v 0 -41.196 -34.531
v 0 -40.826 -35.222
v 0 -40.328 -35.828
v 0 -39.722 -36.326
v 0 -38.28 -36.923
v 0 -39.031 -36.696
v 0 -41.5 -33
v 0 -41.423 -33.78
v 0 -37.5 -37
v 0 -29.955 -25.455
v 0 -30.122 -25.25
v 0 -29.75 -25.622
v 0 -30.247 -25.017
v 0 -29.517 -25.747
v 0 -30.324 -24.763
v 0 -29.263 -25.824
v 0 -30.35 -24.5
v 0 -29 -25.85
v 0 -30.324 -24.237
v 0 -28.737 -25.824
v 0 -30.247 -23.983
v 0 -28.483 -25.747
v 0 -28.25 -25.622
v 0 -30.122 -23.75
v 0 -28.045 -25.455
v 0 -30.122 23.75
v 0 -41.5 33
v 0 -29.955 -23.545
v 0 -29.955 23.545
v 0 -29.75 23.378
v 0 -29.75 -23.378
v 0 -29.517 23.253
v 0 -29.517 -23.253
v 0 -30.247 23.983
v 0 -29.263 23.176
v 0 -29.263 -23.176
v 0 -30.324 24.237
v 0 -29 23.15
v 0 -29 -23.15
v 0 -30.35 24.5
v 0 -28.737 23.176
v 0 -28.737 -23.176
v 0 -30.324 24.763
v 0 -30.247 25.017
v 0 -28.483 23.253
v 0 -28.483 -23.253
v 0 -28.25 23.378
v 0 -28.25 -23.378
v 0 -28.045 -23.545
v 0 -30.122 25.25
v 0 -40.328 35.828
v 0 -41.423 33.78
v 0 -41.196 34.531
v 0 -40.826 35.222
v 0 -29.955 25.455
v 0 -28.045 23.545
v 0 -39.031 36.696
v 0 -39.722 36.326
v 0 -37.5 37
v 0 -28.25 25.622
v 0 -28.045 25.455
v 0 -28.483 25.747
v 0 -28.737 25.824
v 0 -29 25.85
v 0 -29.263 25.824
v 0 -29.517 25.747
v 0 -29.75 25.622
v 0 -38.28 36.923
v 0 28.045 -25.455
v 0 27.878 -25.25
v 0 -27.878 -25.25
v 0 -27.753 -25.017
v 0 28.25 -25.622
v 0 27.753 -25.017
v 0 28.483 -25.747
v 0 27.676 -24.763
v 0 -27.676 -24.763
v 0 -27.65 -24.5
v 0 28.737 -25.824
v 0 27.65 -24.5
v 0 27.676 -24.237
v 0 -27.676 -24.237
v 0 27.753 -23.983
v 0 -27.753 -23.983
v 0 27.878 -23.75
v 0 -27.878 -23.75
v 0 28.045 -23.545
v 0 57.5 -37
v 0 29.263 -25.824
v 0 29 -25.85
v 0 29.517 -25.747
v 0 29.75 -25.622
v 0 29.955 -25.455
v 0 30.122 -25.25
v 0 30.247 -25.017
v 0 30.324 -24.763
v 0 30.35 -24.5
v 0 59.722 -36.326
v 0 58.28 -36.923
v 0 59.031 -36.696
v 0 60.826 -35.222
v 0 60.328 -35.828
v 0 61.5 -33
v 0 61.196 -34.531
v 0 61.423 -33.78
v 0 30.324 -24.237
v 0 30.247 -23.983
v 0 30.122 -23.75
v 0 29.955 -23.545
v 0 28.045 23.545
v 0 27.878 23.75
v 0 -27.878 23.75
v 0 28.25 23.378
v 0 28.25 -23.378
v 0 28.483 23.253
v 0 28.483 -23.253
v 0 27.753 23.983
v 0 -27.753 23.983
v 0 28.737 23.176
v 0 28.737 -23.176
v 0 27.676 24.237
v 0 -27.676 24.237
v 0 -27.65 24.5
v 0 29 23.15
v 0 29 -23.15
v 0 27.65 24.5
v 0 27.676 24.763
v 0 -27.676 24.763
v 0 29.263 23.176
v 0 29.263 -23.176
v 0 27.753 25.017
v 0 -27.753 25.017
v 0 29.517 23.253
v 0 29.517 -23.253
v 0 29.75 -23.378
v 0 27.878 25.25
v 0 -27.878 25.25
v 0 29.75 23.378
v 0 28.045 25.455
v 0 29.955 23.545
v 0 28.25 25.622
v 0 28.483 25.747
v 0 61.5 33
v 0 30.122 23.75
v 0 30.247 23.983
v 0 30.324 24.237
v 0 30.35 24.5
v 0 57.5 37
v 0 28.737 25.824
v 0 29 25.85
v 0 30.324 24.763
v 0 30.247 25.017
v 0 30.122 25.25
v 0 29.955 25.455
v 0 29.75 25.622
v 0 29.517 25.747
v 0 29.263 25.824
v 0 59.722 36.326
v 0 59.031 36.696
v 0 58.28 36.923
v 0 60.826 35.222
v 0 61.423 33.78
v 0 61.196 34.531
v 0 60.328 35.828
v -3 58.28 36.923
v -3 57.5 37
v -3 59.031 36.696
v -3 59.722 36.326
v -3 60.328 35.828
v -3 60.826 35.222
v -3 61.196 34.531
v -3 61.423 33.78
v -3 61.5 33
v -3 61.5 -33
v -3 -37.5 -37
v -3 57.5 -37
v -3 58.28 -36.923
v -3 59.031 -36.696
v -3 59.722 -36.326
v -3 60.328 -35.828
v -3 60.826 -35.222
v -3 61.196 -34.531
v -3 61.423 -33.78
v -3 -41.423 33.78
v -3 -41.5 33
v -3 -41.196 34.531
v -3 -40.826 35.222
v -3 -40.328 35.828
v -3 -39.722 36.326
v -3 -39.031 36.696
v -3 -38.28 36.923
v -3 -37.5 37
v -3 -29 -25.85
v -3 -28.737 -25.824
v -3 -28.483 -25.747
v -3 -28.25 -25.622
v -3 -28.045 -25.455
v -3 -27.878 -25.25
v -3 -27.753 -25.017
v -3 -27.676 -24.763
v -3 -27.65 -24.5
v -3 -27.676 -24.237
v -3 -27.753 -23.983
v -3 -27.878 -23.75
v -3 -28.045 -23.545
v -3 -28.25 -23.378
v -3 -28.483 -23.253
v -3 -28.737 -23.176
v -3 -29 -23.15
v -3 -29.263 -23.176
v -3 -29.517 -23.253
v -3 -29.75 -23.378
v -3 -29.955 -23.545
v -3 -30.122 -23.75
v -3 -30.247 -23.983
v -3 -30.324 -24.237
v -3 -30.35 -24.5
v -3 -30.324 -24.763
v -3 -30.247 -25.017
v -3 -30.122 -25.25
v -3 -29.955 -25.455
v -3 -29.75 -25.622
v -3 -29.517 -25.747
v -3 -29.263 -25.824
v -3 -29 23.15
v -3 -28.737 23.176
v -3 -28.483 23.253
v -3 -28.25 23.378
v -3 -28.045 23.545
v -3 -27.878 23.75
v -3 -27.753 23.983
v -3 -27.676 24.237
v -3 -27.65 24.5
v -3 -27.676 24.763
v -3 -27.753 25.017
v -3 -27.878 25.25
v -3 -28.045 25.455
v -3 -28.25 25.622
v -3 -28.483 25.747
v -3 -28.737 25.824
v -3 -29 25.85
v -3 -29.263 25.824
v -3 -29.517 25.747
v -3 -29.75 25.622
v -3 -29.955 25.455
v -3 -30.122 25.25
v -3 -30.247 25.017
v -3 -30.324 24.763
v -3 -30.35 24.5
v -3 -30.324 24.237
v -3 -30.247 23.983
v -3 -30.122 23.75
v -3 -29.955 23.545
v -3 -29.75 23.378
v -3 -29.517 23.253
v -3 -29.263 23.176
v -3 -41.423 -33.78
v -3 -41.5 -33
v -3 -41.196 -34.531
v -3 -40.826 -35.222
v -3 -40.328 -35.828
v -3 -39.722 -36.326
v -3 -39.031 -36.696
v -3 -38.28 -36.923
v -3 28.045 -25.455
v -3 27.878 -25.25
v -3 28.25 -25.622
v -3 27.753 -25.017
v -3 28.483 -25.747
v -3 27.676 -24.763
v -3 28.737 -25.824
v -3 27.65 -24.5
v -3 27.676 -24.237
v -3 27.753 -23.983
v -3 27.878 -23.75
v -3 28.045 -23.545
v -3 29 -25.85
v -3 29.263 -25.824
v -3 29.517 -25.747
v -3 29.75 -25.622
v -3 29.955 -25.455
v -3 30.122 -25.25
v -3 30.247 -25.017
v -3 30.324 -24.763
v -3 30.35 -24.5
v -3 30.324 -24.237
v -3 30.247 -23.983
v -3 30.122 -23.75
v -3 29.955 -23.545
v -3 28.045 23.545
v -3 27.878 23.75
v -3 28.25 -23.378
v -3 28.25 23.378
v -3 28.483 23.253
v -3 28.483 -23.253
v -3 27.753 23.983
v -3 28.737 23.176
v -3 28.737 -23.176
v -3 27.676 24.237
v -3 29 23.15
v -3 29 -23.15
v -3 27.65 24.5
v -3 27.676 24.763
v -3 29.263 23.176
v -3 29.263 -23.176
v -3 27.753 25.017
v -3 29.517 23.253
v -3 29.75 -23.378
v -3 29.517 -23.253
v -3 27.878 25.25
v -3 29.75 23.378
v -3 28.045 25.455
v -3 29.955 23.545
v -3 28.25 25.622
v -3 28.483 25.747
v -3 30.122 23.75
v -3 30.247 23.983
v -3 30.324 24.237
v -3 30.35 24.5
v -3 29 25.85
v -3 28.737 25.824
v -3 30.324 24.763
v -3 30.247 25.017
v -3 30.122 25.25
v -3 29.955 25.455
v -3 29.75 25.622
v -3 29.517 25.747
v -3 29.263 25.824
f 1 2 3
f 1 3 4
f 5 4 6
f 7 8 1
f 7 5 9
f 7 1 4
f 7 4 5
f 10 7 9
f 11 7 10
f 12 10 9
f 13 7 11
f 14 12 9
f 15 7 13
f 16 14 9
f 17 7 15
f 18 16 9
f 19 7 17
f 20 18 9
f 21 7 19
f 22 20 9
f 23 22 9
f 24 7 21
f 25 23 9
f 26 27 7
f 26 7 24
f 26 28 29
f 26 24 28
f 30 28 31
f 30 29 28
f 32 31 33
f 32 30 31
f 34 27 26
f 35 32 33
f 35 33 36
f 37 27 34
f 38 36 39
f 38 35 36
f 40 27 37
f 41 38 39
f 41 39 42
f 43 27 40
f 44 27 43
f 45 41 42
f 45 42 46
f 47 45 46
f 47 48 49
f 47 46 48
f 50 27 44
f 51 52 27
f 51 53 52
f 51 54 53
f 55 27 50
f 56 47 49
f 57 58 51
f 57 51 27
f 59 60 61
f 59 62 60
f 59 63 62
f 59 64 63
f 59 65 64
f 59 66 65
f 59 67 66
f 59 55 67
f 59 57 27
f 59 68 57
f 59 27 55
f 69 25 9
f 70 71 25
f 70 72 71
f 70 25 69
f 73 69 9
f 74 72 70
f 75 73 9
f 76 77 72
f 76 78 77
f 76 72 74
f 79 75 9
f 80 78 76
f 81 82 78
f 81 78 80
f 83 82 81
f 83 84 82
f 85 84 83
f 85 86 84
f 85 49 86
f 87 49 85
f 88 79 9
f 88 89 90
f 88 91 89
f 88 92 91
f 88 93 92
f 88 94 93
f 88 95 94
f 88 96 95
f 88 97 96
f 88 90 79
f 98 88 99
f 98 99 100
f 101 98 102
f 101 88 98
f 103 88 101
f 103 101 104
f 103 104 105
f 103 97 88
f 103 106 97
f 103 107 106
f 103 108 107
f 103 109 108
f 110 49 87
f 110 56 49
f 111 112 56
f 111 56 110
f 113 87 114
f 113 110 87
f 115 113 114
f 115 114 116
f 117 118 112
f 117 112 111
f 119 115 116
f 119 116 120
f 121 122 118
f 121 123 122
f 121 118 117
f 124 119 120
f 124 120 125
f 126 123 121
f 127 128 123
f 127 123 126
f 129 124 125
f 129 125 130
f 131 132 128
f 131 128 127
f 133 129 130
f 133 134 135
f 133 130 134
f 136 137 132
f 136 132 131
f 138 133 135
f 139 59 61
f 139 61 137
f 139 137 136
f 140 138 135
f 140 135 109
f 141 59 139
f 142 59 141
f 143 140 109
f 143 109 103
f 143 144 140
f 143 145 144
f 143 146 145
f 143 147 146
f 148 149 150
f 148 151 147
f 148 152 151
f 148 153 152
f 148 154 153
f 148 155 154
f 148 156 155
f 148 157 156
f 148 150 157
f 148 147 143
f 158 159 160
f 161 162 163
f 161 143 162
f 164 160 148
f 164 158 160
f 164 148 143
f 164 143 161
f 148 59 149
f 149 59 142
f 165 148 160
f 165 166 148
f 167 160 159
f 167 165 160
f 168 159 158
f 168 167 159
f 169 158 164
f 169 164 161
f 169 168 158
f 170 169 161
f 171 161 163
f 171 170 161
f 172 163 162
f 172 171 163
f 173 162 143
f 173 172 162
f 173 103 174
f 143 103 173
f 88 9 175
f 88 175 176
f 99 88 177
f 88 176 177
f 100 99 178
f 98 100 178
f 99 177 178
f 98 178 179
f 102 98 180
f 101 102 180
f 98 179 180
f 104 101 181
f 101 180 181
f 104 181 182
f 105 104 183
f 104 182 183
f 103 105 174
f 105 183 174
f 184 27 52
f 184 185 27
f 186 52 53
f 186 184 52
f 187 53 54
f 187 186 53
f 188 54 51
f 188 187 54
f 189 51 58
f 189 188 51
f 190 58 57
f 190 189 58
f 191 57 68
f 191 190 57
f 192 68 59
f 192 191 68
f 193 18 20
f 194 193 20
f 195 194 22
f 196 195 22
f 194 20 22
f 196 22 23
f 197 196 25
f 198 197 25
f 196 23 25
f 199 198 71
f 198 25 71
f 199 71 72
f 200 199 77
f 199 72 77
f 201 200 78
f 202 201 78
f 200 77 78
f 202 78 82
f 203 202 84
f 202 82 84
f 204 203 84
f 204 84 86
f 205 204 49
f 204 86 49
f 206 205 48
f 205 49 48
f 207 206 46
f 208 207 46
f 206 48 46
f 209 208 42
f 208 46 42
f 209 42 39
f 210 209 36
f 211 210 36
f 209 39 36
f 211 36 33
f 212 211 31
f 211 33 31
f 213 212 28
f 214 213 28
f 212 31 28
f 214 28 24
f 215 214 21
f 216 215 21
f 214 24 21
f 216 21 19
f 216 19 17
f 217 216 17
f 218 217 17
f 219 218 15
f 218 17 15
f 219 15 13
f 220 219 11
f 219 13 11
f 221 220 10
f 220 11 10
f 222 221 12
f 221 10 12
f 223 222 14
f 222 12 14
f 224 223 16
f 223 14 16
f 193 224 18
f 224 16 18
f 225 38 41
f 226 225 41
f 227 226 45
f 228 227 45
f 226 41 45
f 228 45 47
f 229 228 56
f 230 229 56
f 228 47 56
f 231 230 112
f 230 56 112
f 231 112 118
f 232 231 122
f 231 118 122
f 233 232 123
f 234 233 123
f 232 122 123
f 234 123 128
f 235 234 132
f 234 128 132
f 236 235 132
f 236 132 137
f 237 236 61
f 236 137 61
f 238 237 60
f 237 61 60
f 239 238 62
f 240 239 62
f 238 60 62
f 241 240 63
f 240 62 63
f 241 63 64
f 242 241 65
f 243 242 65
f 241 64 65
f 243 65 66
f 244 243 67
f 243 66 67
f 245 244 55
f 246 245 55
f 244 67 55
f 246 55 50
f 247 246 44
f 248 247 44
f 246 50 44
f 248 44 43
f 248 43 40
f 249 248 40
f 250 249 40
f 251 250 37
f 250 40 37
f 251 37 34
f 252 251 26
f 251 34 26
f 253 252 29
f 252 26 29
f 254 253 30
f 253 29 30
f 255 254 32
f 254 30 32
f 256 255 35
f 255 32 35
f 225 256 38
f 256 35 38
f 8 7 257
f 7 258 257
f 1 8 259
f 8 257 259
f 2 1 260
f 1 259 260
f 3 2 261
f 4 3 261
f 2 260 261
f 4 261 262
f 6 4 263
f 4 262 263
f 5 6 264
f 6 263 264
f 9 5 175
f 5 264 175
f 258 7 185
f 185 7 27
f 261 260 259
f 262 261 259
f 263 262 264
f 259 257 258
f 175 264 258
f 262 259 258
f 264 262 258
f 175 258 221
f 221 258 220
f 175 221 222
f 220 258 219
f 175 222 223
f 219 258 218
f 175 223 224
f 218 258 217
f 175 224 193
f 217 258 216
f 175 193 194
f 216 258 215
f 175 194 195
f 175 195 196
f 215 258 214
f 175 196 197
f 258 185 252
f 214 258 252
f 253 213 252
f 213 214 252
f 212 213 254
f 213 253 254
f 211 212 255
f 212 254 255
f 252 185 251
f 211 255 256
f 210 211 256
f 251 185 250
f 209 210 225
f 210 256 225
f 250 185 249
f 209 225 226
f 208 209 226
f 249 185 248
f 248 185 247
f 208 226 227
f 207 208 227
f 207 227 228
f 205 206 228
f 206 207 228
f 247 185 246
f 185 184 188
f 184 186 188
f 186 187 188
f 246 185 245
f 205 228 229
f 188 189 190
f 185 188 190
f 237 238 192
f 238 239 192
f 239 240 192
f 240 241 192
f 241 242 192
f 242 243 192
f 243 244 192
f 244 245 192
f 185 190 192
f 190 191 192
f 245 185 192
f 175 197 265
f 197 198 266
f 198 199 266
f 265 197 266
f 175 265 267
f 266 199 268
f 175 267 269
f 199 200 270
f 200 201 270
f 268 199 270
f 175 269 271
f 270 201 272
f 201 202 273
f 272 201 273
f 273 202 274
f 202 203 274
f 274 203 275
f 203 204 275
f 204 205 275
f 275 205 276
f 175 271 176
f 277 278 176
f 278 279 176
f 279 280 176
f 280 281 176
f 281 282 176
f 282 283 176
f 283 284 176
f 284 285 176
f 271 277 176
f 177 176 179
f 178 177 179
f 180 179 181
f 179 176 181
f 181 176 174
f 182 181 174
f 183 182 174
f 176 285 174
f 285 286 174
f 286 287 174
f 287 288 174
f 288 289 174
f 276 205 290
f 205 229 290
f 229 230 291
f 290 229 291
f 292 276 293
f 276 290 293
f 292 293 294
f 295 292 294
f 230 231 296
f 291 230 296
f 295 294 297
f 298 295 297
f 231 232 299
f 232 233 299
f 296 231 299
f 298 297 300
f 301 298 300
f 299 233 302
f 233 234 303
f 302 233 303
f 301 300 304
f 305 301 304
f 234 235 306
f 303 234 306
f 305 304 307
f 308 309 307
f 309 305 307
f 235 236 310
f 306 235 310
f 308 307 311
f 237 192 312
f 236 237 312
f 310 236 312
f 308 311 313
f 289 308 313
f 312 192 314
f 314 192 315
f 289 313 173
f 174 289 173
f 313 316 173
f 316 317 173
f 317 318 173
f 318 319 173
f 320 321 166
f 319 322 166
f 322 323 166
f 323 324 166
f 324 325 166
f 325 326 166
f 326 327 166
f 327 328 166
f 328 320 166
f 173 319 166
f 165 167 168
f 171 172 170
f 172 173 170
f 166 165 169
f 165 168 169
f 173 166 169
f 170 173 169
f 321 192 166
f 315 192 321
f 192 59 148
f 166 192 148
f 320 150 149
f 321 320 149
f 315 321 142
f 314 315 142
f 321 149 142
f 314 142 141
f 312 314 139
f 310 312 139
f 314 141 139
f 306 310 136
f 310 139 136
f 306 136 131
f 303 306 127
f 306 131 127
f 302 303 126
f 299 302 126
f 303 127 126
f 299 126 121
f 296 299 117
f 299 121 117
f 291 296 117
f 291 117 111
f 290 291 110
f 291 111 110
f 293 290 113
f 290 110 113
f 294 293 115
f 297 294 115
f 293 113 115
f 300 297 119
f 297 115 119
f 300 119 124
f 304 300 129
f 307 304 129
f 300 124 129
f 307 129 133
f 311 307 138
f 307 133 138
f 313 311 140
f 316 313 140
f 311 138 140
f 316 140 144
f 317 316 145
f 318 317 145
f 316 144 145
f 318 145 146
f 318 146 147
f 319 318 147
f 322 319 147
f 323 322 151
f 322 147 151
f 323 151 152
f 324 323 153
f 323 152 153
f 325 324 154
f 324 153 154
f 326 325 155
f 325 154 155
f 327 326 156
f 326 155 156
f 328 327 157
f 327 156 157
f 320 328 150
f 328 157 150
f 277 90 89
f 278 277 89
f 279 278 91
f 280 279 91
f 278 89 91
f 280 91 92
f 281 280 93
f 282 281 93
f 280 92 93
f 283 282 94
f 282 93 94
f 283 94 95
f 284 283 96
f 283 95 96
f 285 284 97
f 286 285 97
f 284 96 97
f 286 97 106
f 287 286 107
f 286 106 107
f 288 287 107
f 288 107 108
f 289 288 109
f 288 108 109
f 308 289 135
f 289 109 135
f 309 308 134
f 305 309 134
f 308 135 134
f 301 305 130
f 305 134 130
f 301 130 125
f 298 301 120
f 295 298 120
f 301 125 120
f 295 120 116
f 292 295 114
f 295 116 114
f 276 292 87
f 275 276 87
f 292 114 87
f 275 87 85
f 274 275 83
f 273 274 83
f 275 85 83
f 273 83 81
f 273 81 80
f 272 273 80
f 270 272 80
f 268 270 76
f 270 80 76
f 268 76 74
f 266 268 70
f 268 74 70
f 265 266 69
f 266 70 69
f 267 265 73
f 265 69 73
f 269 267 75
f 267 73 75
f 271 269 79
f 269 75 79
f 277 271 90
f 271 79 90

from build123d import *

# Parameters (mm, degrees)
SKETCH1_W           = 103
SKETCH1_H           = 74
BOSS_EXTRUDE2_DEPTH = 3
SKETCH1_12_R        = 1.35
CUT_EXTRUDE1_DEPTH  = 3
FILLET1_R           = 4


with BuildPart() as part:
    # Sketch1 → Boss-Extrude2 (new body)
    with BuildSketch(Plane.YZ):
        with Locations((10, 0)):
            Rectangle(SKETCH1_W, SKETCH1_H)
    extrude(amount=-BOSS_EXTRUDE2_DEPTH)

    # Sketch1<12> → Cut-Extrude1 (cut)
    with BuildSketch(Plane.YZ):
        with Locations((29, -24.5)):
            Circle(SKETCH1_12_R)
        with Locations((-29, -24.5)):
            Circle(SKETCH1_12_R)
        with Locations((-29, 24.5)):
            Circle(SKETCH1_12_R)
        with Locations((29, 24.5)):
            Circle(SKETCH1_12_R)
    extrude(amount=-CUT_EXTRUDE1_DEPTH, mode=Mode.SUBTRACT)

    # Fillet1
    fillet1_edges = [part.edges().sort_by_distance(p)[0] for p in [
        (-1.5, -41.5, 37),
        (-1.5, 61.5, 37),
        (-1.5, 61.5, -37),
        (-1.5, -41.5, -37),
    ]]
    fillet(fillet1_edges, radius=FILLET1_R)


solid = part.part
